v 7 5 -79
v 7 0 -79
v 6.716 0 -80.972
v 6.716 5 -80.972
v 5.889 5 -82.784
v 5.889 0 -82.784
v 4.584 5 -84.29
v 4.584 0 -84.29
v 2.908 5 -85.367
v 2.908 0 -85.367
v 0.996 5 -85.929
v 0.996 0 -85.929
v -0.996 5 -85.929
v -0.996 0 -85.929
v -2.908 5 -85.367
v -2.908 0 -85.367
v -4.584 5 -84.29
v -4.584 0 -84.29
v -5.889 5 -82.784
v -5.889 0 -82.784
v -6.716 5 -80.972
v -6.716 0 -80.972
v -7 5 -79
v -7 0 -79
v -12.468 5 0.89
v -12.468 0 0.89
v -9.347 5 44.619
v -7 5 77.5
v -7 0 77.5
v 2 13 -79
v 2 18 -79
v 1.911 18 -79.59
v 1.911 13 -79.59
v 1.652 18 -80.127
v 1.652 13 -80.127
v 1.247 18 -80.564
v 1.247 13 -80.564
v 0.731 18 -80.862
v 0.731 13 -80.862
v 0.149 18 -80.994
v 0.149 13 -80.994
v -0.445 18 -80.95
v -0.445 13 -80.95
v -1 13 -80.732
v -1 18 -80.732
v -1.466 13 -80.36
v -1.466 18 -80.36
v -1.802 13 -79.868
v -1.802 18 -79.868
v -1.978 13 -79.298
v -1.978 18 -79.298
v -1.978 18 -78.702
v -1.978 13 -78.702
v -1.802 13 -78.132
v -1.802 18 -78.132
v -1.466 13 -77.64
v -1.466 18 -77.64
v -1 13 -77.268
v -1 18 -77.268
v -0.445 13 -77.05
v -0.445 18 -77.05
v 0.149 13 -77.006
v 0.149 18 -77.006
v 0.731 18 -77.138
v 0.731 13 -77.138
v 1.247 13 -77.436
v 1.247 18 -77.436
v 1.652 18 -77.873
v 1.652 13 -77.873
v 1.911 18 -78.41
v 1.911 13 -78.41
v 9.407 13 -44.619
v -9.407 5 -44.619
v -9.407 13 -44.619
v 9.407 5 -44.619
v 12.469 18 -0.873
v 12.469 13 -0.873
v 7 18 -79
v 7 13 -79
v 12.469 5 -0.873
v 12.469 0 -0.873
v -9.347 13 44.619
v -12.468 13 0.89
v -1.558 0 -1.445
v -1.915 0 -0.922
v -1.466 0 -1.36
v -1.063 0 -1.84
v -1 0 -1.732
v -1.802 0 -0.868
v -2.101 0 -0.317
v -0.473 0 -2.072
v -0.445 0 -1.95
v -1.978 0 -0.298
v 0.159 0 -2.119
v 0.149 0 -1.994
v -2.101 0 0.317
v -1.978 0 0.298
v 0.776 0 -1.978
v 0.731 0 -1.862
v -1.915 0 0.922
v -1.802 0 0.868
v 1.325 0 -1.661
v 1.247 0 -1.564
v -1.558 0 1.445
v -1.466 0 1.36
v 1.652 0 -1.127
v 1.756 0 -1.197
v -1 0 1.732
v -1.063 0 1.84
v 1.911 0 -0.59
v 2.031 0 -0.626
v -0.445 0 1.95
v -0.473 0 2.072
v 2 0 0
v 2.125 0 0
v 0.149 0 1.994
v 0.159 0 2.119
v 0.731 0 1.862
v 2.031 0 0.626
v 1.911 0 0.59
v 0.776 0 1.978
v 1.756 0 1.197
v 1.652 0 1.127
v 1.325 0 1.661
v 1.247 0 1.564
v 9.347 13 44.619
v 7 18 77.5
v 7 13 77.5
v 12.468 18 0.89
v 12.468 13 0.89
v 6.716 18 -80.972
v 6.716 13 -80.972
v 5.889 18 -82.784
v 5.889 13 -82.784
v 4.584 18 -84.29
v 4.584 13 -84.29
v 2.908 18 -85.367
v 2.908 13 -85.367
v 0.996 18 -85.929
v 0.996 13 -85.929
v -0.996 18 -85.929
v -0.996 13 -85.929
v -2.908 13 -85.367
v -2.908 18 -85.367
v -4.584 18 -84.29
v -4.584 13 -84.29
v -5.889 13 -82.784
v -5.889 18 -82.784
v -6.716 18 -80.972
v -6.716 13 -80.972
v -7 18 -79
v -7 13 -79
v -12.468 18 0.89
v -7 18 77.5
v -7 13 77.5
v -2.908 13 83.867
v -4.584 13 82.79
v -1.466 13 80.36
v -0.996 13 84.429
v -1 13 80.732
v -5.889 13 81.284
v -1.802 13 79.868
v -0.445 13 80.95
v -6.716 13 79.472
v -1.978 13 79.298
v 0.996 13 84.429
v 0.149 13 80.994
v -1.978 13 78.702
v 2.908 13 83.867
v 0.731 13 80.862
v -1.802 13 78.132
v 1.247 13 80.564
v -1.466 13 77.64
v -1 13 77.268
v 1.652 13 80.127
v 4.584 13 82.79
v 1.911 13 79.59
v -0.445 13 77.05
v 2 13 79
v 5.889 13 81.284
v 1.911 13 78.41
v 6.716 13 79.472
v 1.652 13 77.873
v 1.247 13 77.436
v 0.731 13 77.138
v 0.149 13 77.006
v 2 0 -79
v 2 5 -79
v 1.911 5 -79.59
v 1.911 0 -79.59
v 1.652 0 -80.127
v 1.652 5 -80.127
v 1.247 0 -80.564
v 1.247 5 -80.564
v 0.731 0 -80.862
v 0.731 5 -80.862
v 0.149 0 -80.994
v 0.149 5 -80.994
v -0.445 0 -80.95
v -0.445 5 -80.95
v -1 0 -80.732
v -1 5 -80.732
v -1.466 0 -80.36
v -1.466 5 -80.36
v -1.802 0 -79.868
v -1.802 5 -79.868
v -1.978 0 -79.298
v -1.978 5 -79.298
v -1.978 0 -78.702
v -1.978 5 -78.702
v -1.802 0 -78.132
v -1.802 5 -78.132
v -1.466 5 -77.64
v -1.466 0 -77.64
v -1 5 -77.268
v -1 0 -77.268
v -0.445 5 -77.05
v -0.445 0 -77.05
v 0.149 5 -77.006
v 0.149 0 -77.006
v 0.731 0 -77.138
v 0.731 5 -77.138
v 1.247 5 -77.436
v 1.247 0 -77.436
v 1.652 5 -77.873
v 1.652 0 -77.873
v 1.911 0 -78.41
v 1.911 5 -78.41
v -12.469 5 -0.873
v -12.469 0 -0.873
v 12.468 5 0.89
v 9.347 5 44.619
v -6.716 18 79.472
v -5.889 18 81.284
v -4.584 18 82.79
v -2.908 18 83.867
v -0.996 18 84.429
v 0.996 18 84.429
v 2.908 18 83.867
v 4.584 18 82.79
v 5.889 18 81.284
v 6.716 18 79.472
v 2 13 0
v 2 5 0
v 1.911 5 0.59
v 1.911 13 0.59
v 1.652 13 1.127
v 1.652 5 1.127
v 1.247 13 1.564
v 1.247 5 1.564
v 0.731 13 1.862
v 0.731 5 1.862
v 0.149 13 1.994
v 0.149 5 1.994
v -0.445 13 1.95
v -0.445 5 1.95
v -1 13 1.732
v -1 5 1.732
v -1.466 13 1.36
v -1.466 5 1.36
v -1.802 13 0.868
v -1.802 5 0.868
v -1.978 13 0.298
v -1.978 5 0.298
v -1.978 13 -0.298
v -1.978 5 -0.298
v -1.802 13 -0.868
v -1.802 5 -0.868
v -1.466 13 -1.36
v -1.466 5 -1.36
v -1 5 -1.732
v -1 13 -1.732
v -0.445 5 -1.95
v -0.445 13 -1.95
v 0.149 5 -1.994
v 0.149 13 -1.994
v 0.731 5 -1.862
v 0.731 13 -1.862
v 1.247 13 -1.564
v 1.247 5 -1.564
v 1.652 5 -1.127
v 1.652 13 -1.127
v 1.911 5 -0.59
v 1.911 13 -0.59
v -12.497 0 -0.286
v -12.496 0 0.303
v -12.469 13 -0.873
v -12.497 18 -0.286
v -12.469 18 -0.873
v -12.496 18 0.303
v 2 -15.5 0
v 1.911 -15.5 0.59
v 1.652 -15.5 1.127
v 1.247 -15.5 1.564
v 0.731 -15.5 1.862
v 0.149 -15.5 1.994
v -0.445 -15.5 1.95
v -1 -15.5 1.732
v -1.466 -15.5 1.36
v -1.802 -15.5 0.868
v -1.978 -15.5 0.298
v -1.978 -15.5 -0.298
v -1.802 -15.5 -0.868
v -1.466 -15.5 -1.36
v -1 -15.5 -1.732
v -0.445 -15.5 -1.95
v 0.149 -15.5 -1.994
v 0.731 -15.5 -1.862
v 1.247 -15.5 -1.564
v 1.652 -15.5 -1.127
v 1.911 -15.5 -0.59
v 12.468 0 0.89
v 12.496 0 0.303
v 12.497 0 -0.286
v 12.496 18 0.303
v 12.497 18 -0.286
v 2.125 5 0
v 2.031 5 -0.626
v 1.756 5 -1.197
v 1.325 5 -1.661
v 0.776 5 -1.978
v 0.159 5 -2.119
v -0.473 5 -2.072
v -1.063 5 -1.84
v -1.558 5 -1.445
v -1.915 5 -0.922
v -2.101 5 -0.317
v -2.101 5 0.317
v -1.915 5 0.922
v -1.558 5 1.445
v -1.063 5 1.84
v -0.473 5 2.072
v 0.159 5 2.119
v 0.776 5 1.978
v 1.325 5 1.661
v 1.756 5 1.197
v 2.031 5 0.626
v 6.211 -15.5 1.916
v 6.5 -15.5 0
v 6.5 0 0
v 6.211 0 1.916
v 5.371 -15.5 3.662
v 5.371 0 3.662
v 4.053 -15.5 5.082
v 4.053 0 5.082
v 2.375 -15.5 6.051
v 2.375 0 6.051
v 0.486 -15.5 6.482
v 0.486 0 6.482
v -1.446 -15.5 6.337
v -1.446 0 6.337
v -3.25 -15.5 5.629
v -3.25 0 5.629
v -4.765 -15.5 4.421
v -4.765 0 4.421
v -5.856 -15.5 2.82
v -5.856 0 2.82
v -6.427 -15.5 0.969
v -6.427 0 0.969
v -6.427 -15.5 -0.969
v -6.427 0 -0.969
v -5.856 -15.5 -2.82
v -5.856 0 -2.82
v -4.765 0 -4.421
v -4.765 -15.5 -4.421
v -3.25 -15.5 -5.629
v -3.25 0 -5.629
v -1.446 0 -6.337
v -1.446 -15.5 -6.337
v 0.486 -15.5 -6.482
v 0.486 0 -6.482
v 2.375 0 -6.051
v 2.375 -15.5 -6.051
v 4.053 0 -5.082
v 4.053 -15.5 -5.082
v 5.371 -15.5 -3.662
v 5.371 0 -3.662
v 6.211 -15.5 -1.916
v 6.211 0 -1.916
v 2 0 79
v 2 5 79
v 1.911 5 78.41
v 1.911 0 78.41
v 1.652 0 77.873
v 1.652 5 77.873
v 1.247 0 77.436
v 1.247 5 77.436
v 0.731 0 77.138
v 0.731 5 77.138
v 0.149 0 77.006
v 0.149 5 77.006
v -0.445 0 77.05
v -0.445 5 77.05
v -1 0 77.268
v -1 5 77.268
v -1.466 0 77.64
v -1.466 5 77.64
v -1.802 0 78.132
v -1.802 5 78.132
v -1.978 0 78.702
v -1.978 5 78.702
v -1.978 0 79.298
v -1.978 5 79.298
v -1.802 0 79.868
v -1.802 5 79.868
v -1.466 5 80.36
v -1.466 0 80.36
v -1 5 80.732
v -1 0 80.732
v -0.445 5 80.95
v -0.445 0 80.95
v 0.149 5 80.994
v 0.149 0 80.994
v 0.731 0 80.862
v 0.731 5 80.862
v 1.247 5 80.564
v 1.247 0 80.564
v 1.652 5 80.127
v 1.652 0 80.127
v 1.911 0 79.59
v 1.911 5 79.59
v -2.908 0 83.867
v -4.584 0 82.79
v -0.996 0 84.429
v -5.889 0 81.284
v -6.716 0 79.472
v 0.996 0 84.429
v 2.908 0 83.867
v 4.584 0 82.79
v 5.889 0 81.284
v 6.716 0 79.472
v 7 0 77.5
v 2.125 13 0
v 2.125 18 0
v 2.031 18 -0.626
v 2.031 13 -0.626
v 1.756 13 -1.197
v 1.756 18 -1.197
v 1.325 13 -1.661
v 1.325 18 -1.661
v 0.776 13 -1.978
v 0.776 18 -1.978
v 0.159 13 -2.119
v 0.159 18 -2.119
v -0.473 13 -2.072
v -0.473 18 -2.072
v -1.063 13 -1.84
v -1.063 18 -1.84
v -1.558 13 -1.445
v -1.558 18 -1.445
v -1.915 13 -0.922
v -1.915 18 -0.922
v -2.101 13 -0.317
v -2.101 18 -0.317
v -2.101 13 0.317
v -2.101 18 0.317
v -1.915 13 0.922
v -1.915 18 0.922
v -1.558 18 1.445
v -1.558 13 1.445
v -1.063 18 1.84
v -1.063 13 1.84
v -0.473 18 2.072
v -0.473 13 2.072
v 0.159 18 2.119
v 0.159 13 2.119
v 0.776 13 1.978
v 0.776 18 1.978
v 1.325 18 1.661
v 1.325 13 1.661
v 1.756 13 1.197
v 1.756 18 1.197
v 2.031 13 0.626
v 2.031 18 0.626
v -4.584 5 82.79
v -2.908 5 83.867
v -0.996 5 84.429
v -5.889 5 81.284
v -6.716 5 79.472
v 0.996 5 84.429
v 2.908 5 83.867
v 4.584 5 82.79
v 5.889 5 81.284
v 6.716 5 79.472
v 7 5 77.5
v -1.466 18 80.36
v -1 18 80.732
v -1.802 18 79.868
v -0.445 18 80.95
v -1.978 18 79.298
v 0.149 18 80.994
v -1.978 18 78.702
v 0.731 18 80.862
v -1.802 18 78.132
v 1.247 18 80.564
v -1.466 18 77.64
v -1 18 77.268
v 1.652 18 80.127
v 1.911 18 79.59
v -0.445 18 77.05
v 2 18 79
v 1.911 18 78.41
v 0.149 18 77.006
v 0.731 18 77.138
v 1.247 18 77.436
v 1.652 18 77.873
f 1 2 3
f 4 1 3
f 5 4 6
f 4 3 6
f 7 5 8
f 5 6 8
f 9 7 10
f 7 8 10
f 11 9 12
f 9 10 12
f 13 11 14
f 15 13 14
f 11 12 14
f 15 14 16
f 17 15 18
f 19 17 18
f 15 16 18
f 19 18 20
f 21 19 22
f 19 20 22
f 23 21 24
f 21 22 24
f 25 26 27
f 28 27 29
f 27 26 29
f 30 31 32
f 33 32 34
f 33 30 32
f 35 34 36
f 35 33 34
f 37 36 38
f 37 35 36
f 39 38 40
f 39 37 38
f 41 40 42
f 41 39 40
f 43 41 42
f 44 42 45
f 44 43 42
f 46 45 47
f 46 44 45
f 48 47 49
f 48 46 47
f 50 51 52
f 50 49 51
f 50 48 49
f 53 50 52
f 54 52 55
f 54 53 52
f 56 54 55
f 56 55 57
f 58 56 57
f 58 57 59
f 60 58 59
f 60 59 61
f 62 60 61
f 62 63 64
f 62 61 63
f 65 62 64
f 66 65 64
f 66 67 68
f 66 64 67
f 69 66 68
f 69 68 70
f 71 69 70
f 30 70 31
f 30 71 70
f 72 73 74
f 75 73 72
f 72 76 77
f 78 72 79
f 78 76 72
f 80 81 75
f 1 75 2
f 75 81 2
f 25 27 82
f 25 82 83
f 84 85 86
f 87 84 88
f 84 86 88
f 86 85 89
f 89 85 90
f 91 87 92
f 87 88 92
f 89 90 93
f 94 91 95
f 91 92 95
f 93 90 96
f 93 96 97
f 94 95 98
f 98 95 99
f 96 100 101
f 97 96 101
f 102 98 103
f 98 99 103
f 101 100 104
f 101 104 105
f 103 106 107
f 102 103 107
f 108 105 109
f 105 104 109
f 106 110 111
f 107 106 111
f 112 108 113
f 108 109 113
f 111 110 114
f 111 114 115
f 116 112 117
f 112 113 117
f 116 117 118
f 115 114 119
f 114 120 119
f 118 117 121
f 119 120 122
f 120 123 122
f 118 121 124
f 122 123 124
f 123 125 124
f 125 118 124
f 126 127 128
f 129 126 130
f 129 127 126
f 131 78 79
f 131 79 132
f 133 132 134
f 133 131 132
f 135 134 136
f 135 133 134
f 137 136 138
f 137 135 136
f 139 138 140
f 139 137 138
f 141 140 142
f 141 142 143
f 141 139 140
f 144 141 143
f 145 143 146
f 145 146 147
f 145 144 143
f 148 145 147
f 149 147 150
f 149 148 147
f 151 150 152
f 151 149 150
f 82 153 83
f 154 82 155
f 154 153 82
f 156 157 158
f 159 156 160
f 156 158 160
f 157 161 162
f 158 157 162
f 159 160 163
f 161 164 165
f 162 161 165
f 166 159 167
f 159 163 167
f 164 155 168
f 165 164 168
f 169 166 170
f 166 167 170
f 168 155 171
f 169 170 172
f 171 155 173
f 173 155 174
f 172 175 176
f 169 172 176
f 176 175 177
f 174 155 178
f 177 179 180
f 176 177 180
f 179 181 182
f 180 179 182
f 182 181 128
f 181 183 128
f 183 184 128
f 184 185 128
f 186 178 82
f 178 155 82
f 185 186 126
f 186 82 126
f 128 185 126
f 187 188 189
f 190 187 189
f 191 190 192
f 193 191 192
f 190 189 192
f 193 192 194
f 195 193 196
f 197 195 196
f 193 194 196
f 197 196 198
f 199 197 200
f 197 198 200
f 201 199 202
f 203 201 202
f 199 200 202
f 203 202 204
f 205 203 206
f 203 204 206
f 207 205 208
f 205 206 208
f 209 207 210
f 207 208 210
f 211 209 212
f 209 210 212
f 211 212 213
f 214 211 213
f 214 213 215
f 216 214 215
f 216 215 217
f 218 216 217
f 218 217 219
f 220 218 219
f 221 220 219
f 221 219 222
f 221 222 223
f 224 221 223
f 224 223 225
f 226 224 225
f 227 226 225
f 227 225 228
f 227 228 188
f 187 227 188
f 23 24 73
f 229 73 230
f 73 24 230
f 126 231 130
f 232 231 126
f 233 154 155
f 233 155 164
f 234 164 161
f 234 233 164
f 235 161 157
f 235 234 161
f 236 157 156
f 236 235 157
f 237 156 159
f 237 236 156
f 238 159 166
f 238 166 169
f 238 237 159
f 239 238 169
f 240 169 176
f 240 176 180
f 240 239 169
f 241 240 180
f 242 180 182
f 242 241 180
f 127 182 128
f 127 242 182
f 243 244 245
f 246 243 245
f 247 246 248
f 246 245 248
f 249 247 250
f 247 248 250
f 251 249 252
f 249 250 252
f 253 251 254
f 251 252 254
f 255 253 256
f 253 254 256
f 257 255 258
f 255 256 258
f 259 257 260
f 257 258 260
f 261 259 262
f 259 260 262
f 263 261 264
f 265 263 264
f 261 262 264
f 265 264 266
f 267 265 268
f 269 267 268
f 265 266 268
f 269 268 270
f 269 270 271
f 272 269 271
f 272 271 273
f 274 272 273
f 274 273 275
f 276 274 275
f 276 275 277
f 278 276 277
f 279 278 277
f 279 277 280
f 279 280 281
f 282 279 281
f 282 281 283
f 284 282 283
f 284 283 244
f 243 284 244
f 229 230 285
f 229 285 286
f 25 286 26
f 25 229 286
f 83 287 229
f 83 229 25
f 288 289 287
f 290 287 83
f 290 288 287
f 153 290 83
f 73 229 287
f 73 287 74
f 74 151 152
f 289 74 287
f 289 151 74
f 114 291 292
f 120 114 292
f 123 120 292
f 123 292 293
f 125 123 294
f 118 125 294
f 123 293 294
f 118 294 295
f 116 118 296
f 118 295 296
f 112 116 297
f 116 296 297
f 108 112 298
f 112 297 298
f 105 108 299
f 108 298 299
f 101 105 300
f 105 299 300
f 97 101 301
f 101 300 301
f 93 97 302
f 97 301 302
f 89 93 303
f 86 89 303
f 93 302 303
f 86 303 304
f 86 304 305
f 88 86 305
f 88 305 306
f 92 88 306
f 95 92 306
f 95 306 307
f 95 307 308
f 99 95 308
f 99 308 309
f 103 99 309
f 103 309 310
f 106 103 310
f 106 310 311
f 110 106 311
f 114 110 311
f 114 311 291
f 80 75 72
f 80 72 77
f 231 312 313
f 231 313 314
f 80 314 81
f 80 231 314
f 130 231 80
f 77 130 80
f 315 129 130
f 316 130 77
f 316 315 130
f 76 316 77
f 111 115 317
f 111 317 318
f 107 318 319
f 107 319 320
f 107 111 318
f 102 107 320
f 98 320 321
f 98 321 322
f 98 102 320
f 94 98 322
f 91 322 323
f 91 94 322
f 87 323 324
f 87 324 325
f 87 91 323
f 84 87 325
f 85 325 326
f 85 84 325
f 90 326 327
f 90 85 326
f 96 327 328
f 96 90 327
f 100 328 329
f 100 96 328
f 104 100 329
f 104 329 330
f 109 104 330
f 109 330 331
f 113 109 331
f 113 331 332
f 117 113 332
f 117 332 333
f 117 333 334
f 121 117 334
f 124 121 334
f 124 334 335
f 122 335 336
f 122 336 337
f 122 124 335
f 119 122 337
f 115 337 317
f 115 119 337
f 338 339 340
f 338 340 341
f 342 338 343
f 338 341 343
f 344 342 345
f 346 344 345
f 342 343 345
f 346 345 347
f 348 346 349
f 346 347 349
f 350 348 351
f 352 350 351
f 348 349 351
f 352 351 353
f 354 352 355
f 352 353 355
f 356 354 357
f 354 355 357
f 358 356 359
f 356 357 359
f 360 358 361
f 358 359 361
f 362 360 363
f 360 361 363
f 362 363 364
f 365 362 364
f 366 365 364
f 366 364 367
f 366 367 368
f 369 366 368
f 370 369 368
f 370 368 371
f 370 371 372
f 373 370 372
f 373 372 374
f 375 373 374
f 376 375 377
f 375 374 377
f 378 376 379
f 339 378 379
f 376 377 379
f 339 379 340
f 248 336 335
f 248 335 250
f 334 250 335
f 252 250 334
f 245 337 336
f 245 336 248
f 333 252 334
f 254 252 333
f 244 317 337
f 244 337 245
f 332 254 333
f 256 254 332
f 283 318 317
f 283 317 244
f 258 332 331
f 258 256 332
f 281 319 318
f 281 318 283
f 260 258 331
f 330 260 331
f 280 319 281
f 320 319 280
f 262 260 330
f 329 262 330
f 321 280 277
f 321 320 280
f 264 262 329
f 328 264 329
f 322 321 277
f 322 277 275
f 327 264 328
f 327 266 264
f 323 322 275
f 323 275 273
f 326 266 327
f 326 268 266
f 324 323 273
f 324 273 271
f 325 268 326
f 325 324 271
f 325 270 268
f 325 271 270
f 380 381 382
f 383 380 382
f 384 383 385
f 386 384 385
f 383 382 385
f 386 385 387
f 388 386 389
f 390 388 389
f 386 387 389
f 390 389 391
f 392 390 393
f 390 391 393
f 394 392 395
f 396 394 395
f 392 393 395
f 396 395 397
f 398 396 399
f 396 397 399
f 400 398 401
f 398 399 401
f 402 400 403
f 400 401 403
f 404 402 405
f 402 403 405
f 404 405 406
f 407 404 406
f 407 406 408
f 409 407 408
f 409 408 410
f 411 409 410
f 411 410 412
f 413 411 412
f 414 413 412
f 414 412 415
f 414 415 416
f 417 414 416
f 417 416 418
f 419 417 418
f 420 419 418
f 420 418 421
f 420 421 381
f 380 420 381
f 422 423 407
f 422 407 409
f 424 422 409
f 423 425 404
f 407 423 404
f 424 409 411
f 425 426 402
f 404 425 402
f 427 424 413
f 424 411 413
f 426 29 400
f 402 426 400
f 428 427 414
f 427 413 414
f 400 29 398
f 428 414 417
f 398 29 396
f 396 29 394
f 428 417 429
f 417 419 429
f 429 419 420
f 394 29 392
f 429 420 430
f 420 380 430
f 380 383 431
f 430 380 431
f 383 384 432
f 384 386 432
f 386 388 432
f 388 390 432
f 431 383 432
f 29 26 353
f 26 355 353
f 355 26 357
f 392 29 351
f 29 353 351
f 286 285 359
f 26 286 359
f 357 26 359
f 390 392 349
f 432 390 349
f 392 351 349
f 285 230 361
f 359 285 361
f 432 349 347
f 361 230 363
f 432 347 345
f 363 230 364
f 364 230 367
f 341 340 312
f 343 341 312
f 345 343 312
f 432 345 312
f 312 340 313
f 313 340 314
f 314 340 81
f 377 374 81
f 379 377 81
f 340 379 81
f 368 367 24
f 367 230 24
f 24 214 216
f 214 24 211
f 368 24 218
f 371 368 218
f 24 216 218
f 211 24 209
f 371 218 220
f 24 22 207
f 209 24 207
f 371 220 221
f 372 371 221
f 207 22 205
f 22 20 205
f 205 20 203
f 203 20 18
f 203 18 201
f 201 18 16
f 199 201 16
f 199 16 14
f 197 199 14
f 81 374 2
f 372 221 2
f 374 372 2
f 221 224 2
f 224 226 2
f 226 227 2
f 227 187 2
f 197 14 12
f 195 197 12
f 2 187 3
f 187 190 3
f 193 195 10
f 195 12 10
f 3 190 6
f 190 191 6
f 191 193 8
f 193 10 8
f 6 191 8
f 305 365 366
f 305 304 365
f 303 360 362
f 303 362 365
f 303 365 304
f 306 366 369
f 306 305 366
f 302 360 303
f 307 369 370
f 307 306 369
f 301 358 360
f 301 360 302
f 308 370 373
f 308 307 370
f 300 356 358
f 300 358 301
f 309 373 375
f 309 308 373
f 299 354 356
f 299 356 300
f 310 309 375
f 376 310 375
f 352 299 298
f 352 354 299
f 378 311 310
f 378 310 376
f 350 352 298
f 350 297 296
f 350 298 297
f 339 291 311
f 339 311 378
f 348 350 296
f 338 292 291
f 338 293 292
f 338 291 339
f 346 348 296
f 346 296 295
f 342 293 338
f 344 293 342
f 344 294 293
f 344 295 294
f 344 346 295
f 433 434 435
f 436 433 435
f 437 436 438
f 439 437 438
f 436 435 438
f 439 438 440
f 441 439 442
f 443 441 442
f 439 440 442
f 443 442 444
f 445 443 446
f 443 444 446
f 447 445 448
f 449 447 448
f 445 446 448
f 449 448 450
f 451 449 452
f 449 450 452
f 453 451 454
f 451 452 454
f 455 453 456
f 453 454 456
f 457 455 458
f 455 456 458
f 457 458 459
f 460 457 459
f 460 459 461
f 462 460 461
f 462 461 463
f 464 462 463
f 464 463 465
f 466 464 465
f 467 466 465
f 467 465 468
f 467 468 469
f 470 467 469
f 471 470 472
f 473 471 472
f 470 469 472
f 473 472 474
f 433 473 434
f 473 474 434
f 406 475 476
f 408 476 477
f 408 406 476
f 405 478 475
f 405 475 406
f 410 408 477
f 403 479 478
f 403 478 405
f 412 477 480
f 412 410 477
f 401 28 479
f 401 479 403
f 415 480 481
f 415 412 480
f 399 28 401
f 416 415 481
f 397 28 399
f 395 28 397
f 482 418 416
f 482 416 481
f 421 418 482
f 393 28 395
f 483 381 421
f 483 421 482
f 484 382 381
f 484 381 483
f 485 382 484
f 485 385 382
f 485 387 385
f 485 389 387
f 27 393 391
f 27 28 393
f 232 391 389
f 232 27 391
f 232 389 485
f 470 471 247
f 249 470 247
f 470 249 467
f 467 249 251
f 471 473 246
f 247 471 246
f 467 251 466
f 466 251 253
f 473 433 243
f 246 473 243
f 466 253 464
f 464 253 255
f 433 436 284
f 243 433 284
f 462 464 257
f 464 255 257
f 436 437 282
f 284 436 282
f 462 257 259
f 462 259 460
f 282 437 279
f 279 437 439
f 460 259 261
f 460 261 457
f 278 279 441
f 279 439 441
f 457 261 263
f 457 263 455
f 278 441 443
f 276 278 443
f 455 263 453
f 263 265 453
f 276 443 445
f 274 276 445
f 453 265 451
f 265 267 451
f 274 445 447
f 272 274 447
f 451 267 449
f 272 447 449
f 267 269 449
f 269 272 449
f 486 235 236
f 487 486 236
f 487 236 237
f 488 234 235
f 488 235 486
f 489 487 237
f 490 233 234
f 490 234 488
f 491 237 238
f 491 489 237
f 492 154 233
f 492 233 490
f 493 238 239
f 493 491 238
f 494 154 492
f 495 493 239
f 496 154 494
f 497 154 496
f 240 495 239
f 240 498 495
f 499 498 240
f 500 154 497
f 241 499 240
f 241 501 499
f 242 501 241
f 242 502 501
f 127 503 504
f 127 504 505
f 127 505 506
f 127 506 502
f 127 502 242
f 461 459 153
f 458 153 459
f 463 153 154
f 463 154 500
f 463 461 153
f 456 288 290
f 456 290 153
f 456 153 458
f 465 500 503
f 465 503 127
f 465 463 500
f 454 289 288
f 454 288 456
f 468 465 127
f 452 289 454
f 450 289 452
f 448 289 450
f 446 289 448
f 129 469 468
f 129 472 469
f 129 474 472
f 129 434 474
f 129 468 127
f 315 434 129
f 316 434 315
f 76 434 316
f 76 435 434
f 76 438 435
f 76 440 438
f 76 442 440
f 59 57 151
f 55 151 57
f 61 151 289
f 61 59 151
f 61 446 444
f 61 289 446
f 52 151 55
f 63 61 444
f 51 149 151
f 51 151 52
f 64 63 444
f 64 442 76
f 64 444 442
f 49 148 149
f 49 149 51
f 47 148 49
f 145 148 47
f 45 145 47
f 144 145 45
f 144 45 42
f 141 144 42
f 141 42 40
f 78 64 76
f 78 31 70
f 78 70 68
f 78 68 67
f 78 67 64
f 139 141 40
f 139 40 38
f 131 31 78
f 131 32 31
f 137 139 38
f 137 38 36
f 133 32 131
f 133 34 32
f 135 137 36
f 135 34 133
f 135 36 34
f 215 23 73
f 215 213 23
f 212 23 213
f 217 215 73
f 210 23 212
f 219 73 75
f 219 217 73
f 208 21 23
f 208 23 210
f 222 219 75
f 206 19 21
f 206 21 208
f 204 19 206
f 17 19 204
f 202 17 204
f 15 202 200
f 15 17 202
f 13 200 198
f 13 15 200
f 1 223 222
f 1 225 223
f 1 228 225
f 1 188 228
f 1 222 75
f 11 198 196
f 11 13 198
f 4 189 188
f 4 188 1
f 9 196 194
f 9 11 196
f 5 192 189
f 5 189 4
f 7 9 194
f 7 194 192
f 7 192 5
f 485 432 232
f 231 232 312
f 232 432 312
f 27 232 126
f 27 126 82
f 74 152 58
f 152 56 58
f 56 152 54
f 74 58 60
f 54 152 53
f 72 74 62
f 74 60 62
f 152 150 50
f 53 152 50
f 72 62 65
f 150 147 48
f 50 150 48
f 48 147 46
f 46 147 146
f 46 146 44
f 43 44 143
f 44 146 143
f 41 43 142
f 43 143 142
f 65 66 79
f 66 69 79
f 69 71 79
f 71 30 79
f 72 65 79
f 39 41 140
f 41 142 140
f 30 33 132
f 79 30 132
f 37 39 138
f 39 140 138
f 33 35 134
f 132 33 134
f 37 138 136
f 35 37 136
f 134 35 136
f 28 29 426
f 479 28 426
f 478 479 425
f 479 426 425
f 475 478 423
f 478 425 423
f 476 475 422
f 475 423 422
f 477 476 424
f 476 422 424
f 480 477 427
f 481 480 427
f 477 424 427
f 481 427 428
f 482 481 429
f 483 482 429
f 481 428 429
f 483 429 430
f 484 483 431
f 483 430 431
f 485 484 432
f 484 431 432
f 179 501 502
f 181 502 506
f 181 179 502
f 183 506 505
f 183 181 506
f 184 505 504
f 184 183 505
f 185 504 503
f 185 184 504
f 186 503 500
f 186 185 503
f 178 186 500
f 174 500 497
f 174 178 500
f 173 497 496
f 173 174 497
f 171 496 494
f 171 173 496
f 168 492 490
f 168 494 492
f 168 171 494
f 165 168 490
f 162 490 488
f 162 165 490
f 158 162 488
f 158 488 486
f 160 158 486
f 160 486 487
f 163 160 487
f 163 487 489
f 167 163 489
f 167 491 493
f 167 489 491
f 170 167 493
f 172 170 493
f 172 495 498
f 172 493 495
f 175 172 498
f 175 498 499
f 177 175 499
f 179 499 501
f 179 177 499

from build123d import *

# Parameters (mm, degrees)
SKETCH1_R           = 2.125
BOSS_EXTRUDE1_DEPTH = 5
SKETCH2_R           = 2
CUT_EXTRUDE1_DEPTH  = 10
SKETCH5_R           = 6.5
BOSS_EXTRUDE2_DEPTH = 15.5
BOSS_EXTRUDE3_DEPTH = 8
SKETCH8_R           = 2
CUT_EXTRUDE2_DEPTH  = 34.5


with BuildPart() as part:
    # Sketch1 → Boss-Extrude1 (new body)
    with BuildSketch(Plane(origin=(0, 0, 0), x_dir=(1, 0, 0), z_dir=(0, 1, 0))):
        with BuildLine():
            Line((-7, 79), (-12.469480556, 0.872957419))
            ThreePointArc((-12.469480556, 0.872957419), (-12.499997094, -0.008523482), (-12.468278459, -0.889961946))
            Line((-12.468278459, -0.889961946), (-7, -77.5))
            ThreePointArc((-7, -77.5), (0, -84.5), (7, -77.5))
            Line((7, -77.5), (12.468278459, -0.889961946))
            ThreePointArc((12.468278459, -0.889961946), (12.499997094, -0.008523482), (12.469480556, 0.872957419))
            Line((12.469480556, 0.872957419), (7, 79))
            ThreePointArc((7, 79), (0, 86), (-7, 79))
        make_face()
        Circle(SKETCH1_R, mode=Mode.SUBTRACT)
    boss_extrude1 = extrude(amount=BOSS_EXTRUDE1_DEPTH)

    # Sketch2 → Cut-Extrude1 (cut)
    with BuildSketch(Plane(origin=(0, 5, 0), x_dir=(1, 0, 0), z_dir=(0, 1, 0))):
        with Locations((0, 79)):
            Circle(SKETCH2_R)
        with Locations((0, -79)):
            Circle(SKETCH2_R)
    cut_extrude1 = extrude(amount=-CUT_EXTRUDE1_DEPTH, mode=Mode.SUBTRACT)

    # Sketch5 → Boss-Extrude2 (add)
    with BuildSketch(Plane.XZ):
        Circle(SKETCH5_R)
    extrude(amount=BOSS_EXTRUDE2_DEPTH)

    # Sketch6 → Boss-Extrude3 (add)
    with BuildSketch(Plane(origin=(0, 5, 0), x_dir=(1, 0, 0), z_dir=(0, 1, 0))):
        with BuildLine():
            Line((-9.4069118, 44.619239575), (9.4069118, 44.619239575))
            Line((9.4069118, 44.619239575), (12.469480556, 0.872957419))
            ThreePointArc((12.469480556, 0.872957419), (12.499997094, -0.008523482), (12.468278459, -0.889961946))
            Line((12.468278459, -0.889961946), (9.346965992, -44.619239575))
            Line((9.346965992, -44.619239575), (-9.346965992, -44.619239575))
            Line((-9.346965992, -44.619239575), (-12.468278459, -0.889961946))
            ThreePointArc((-12.468278459, -0.889961946), (-12.499997094, -0.008523482), (-12.469480556, 0.872957419))
            Line((-12.469480556, 0.872957419), (-9.4069118, 44.619239575))
        make_face()
    extrude(amount=BOSS_EXTRUDE3_DEPTH)

    # Mirror1: Boss-Extrude1, Cut-Extrude1 across plane
    add(boss_extrude1.mirror(Plane.ZX.offset(9)))
    add(cut_extrude1.mirror(Plane.ZX.offset(9)), mode=Mode.SUBTRACT)

    # Sketch8 → Cut-Extrude2 (cut, through all)
    with BuildSketch(Plane.XZ.offset(15.5)):
        Circle(SKETCH8_R)
    extrude(amount=-CUT_EXTRUDE2_DEPTH, mode=Mode.SUBTRACT)


solid = part.part
